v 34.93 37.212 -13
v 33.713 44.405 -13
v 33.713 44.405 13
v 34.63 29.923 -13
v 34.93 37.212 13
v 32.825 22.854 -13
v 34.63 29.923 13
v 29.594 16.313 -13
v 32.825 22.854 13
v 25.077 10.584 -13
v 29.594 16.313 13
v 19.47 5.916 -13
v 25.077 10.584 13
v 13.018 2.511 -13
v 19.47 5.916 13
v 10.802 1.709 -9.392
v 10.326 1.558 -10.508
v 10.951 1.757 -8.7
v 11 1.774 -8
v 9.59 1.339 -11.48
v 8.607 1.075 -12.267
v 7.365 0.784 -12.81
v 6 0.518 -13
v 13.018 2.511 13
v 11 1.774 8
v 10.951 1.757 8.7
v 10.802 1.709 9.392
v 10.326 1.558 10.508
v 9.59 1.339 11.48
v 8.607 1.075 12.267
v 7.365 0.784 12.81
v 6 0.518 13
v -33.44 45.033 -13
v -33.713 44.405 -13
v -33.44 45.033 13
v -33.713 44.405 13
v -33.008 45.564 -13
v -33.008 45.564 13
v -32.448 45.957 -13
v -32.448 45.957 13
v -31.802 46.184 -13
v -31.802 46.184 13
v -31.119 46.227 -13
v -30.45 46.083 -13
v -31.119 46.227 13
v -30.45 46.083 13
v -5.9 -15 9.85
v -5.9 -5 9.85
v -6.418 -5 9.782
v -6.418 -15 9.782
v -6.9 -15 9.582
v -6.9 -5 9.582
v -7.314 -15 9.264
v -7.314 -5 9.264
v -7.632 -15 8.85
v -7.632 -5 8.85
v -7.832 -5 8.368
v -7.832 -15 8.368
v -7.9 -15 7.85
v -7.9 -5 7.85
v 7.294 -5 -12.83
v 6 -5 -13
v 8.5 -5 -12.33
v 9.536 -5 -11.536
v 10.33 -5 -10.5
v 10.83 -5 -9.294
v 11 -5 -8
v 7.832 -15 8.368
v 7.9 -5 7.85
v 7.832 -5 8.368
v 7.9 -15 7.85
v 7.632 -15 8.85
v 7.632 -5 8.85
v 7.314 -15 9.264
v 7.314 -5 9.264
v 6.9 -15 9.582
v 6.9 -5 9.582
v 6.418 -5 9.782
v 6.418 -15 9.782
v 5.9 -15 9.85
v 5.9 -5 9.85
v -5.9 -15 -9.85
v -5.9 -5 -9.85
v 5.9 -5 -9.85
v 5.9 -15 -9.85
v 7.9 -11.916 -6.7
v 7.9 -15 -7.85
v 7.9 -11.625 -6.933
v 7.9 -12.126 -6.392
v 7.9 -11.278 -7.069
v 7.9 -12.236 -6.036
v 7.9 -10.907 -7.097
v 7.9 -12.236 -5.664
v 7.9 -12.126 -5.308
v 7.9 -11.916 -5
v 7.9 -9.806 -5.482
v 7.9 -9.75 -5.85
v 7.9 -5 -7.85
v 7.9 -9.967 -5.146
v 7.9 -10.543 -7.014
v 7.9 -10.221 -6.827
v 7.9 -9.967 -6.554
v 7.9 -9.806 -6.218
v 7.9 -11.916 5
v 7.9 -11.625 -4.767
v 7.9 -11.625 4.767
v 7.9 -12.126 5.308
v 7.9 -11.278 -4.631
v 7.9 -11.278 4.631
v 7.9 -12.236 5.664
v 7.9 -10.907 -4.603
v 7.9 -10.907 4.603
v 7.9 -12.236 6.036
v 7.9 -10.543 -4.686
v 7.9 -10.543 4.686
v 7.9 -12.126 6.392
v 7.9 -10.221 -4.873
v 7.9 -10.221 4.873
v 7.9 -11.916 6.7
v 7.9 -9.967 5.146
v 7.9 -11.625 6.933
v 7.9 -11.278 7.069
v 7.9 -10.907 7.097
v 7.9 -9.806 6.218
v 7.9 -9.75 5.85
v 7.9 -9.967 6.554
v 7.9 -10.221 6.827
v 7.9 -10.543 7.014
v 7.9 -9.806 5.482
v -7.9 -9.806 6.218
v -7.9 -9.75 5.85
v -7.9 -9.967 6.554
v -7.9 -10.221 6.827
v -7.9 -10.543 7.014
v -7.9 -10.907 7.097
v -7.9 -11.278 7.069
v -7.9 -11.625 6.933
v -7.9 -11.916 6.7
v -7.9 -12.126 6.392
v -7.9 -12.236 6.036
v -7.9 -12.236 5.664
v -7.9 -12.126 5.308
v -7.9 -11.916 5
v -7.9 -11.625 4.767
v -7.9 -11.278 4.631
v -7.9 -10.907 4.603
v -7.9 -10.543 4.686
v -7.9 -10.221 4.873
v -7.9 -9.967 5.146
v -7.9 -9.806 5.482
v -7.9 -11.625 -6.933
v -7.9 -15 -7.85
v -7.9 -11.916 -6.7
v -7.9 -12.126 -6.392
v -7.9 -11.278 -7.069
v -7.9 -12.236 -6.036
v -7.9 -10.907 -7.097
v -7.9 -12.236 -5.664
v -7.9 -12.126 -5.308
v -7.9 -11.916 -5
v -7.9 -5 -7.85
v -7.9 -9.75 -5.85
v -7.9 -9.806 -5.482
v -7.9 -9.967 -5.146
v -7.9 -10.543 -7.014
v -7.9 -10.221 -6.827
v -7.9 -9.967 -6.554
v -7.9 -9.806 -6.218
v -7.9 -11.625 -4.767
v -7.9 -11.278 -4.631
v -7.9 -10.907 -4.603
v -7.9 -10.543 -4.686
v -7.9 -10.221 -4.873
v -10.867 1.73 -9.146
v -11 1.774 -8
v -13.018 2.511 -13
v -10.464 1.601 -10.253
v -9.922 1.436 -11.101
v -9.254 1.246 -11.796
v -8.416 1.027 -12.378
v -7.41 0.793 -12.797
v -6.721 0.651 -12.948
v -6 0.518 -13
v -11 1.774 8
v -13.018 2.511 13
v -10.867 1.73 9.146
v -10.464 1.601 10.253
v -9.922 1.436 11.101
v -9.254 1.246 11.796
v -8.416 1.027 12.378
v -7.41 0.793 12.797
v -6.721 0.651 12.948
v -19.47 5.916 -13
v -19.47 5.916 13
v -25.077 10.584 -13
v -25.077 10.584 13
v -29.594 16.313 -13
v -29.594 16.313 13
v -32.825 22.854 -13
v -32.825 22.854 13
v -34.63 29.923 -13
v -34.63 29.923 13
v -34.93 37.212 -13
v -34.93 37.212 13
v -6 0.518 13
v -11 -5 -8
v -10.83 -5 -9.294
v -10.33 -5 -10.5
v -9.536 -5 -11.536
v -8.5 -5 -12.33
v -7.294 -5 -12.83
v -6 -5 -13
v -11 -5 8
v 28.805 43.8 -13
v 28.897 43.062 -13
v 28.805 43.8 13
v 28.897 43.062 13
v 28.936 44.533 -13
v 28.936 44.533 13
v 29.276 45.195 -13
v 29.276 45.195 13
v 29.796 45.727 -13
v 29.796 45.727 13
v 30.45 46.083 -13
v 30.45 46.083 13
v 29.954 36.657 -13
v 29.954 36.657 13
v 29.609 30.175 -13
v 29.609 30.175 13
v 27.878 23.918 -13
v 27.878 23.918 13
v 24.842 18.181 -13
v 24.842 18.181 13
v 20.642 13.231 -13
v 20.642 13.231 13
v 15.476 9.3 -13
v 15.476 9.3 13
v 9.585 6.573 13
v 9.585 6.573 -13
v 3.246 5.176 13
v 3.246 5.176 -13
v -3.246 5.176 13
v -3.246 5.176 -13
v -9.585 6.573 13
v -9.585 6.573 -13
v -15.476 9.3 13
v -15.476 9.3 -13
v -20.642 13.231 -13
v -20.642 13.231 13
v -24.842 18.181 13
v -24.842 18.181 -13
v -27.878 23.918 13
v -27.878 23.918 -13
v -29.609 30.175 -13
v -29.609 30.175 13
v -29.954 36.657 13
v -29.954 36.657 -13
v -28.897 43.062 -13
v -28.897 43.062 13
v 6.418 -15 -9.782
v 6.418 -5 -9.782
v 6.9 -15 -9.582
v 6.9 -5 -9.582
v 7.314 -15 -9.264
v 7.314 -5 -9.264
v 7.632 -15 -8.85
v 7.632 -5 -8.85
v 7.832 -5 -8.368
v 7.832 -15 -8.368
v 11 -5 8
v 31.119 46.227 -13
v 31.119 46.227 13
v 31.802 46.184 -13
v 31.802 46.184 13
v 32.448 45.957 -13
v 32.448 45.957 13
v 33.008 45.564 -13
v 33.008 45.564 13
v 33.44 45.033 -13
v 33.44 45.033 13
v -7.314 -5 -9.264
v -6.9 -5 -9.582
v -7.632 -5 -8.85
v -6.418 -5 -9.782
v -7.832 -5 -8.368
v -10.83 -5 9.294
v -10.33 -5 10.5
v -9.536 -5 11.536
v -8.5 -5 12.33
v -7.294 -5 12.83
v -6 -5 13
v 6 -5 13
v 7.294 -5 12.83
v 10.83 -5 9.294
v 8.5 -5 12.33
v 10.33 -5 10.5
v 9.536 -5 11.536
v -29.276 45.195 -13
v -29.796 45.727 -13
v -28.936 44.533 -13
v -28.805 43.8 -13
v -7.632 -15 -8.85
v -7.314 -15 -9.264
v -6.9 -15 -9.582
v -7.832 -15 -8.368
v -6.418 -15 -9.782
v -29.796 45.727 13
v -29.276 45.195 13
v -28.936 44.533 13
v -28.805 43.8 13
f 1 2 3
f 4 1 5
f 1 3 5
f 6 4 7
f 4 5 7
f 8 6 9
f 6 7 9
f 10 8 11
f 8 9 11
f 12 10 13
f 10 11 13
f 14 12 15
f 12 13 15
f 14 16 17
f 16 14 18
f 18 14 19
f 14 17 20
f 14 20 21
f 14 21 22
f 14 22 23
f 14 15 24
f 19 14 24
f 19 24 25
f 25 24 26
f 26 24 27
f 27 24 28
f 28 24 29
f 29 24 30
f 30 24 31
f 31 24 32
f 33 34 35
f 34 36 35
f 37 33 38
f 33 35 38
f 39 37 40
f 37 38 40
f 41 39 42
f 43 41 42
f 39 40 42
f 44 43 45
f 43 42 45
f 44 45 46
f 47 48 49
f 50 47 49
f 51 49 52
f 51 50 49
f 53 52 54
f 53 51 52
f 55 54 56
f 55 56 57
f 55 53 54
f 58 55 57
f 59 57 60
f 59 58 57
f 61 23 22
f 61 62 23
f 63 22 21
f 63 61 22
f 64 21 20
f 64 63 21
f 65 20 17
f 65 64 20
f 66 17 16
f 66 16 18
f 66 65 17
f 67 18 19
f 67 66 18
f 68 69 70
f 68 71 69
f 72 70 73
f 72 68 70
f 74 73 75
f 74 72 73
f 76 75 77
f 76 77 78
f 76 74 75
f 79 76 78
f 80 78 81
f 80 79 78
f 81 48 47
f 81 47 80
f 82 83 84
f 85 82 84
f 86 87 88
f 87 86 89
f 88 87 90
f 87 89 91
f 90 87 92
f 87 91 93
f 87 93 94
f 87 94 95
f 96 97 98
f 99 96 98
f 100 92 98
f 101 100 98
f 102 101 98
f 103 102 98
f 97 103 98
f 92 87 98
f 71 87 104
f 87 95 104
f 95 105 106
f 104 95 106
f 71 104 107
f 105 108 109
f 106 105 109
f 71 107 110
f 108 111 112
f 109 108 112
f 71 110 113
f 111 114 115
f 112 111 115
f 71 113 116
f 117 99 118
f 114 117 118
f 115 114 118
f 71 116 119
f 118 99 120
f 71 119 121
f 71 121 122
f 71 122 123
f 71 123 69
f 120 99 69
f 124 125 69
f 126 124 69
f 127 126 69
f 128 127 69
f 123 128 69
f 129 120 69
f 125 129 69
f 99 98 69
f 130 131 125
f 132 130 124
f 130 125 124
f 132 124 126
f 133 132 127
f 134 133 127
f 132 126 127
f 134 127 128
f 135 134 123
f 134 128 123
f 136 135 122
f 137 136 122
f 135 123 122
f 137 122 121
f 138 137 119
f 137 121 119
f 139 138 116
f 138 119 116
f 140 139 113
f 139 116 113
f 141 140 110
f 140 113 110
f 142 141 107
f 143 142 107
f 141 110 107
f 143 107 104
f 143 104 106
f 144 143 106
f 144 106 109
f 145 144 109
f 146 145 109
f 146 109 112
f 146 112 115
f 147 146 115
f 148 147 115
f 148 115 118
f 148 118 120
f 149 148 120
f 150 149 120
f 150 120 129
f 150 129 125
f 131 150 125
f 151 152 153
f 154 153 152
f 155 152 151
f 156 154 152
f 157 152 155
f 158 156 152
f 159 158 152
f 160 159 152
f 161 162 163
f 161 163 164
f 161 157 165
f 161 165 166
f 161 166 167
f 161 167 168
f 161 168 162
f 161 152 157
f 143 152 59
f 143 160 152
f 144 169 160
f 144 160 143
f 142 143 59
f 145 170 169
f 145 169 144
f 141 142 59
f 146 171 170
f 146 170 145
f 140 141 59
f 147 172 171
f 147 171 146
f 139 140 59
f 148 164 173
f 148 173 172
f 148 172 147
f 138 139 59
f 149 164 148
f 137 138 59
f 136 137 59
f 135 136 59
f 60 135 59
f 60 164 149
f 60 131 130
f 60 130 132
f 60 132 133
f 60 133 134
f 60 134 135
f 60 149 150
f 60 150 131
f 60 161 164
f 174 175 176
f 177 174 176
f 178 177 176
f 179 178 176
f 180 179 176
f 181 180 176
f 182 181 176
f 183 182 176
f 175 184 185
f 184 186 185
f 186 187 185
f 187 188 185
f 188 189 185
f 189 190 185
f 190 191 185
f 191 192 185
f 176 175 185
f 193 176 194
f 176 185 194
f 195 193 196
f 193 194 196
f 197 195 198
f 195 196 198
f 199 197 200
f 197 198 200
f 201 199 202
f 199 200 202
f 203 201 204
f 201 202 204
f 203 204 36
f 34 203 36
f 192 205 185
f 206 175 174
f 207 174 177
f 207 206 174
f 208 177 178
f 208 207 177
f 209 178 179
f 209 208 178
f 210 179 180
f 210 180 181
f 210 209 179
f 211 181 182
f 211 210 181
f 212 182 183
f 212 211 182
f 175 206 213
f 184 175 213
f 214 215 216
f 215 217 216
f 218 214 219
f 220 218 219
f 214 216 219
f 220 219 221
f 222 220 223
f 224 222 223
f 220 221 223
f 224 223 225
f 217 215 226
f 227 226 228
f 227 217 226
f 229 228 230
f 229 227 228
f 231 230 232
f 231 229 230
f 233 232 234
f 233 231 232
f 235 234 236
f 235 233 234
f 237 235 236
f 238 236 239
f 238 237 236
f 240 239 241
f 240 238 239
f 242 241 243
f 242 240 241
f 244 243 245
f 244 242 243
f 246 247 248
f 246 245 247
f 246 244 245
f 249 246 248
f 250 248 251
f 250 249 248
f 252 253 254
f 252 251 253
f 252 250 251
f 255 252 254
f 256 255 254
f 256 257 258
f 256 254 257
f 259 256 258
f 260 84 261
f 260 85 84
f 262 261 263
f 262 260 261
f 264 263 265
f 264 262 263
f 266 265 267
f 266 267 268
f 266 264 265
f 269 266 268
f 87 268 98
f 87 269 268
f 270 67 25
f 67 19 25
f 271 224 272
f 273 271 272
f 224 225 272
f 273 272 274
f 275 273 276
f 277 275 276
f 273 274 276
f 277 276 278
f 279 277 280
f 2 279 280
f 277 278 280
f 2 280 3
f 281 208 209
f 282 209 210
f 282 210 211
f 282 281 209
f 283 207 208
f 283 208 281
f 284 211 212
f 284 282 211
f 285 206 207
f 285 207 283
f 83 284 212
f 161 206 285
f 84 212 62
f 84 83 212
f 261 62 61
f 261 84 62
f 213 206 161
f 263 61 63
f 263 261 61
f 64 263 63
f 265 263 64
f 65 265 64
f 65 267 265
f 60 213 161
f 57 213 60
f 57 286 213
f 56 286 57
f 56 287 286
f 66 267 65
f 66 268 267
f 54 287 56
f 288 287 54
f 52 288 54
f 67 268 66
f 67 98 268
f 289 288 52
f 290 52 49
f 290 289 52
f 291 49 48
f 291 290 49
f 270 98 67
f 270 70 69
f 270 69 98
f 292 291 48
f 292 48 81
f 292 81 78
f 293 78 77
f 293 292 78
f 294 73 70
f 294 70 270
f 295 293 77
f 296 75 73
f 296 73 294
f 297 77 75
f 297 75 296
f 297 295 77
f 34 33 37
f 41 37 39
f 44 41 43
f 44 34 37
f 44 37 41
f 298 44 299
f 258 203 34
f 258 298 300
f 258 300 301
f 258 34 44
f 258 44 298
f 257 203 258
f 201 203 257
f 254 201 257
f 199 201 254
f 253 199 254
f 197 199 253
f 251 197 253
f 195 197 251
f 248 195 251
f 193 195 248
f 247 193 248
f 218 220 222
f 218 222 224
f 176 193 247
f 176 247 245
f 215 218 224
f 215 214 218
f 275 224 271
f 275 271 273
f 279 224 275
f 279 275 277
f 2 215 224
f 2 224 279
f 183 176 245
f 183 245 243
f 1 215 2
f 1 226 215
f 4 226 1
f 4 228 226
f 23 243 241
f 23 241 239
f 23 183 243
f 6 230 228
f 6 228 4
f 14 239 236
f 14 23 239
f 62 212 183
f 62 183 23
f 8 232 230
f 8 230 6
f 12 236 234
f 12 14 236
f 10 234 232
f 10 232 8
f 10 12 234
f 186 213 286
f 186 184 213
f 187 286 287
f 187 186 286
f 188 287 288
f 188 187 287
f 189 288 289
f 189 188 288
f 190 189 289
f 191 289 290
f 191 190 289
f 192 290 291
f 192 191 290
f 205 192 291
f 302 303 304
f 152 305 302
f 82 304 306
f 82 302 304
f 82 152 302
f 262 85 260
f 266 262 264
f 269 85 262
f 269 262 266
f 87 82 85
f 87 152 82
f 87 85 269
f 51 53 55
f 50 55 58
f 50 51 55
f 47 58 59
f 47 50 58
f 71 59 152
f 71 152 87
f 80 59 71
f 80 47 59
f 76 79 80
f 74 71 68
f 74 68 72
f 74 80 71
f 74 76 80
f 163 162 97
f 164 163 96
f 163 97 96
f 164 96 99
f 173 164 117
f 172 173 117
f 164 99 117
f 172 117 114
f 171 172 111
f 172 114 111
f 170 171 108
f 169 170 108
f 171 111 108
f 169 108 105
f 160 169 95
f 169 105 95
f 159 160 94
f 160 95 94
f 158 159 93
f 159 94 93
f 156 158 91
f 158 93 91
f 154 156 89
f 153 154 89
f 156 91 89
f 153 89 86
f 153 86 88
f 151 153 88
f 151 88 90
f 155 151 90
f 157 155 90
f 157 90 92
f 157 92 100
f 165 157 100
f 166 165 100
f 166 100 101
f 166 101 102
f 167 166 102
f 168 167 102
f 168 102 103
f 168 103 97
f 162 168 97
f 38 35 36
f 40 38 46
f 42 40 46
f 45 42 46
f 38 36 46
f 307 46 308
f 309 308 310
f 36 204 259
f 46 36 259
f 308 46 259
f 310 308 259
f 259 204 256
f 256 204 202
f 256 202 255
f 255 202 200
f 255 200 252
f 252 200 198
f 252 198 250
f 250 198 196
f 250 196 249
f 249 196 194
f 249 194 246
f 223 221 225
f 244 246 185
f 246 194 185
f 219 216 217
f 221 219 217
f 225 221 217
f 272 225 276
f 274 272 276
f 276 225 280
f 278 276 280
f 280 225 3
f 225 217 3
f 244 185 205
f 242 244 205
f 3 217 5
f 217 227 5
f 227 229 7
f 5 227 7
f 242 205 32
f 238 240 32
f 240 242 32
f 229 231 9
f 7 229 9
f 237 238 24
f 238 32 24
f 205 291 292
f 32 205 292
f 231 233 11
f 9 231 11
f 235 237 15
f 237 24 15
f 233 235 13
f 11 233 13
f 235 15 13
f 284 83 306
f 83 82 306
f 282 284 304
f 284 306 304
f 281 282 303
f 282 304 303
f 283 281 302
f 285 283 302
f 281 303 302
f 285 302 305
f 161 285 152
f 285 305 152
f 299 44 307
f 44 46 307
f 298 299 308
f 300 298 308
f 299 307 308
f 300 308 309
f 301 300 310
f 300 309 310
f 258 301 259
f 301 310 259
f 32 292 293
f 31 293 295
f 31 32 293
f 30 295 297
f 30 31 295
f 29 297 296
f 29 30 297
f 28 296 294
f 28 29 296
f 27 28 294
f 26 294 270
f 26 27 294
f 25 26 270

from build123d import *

# Parameters (mm, degrees)
F0_W          = 5
F0_H          = 26
F1_ANGLE_BACK = 110
F1_ANGLE      = 220
F2_W          = 22
F2_H          = 26
F3_DEPTH      = 5
F3_DEPTH_BACK = 5
F4_R          = 2.49999
F5_W          = 15.8
F5_H          = 19.7
F6_DEPTH      = 10
F7_R          = 1.25
F8_DEPTH      = 42.901
F9_R          = 2
F10_R         = 5


# Not quite as in the source:
# - a fillet or chamfer is up to 0.001 mm smaller than in the source, because OpenCascade refuses the exact size


with BuildPart() as f1:
    # F0 (on Right) → F1 (revolve)
    with BuildSketch(Plane.YZ, mode=Mode.PRIVATE) as f1_sk:
        with Locations((2.5, 0)):
            Rectangle(F0_W, F0_H)
    revolve(f1_sk.sketch.rotate(Axis((0, 35, 2.8591789305), (0, 0, -1)), -F1_ANGLE_BACK), axis=Axis((0, 35, 2.8591789305), (0, 0, -1)), revolution_arc=F1_ANGLE)

    # F2 (on Front) → F3 (join, two sides)
    with BuildSketch(Plane.XZ) as f3_sk:
        Rectangle(F2_W, F2_H)
    extrude(amount=F3_DEPTH)
    extrude(f3_sk.sketch, amount=-F3_DEPTH_BACK)

    # F4 (radius 2.5 in the source; OpenCascade refuses exactly that, so slightly less here)
    f4_edges = [f1.edges().sort_by_distance(p)[0] for p in [
        (32.889242, 46.970705, 0),
        (28.190779, 45.260604, 0),
        (-28.190779, 45.260604, 0),
        (-32.889242, 46.970705, 0),
    ]]
    fillet(f4_edges, radius=F4_R)

    # F5 (on face) → F6 (join)
    with BuildSketch(Plane.XZ.offset(5)):
        Rectangle(F5_W, F5_H)
    extrude(amount=F6_DEPTH)

    # F7 (on face) → F8 (cut, through all)
    with BuildSketch(Plane.YZ.offset(7.9)):
        with Locations((-11, 5.85)):
            Circle(F7_R)
        with Locations((-11, -5.85)):
            Circle(F7_R)
    extrude(amount=-F8_DEPTH, mode=Mode.SUBTRACT)

    # F9
    f9_edges = [f1.edges().sort_by_distance(p)[0] for p in [
        (7.9, -10, 9.85),
        (7.9, -10, -9.85),
        (-7.9, -10, -9.85),
        (-7.9, -10, 9.85),
    ]]
    fillet(f9_edges, radius=F9_R)

    # F10
    f10_edges = [f1.edges().sort_by_distance(p)[0] for p in [
        (-11, -1.613248, 13),
        (-11, -1.613248, -13),
        (11, -1.613248, -13),
        (11, -1.613248, 13),
    ]]
    fillet(f10_edges, radius=F10_R)


solid = f1.part
